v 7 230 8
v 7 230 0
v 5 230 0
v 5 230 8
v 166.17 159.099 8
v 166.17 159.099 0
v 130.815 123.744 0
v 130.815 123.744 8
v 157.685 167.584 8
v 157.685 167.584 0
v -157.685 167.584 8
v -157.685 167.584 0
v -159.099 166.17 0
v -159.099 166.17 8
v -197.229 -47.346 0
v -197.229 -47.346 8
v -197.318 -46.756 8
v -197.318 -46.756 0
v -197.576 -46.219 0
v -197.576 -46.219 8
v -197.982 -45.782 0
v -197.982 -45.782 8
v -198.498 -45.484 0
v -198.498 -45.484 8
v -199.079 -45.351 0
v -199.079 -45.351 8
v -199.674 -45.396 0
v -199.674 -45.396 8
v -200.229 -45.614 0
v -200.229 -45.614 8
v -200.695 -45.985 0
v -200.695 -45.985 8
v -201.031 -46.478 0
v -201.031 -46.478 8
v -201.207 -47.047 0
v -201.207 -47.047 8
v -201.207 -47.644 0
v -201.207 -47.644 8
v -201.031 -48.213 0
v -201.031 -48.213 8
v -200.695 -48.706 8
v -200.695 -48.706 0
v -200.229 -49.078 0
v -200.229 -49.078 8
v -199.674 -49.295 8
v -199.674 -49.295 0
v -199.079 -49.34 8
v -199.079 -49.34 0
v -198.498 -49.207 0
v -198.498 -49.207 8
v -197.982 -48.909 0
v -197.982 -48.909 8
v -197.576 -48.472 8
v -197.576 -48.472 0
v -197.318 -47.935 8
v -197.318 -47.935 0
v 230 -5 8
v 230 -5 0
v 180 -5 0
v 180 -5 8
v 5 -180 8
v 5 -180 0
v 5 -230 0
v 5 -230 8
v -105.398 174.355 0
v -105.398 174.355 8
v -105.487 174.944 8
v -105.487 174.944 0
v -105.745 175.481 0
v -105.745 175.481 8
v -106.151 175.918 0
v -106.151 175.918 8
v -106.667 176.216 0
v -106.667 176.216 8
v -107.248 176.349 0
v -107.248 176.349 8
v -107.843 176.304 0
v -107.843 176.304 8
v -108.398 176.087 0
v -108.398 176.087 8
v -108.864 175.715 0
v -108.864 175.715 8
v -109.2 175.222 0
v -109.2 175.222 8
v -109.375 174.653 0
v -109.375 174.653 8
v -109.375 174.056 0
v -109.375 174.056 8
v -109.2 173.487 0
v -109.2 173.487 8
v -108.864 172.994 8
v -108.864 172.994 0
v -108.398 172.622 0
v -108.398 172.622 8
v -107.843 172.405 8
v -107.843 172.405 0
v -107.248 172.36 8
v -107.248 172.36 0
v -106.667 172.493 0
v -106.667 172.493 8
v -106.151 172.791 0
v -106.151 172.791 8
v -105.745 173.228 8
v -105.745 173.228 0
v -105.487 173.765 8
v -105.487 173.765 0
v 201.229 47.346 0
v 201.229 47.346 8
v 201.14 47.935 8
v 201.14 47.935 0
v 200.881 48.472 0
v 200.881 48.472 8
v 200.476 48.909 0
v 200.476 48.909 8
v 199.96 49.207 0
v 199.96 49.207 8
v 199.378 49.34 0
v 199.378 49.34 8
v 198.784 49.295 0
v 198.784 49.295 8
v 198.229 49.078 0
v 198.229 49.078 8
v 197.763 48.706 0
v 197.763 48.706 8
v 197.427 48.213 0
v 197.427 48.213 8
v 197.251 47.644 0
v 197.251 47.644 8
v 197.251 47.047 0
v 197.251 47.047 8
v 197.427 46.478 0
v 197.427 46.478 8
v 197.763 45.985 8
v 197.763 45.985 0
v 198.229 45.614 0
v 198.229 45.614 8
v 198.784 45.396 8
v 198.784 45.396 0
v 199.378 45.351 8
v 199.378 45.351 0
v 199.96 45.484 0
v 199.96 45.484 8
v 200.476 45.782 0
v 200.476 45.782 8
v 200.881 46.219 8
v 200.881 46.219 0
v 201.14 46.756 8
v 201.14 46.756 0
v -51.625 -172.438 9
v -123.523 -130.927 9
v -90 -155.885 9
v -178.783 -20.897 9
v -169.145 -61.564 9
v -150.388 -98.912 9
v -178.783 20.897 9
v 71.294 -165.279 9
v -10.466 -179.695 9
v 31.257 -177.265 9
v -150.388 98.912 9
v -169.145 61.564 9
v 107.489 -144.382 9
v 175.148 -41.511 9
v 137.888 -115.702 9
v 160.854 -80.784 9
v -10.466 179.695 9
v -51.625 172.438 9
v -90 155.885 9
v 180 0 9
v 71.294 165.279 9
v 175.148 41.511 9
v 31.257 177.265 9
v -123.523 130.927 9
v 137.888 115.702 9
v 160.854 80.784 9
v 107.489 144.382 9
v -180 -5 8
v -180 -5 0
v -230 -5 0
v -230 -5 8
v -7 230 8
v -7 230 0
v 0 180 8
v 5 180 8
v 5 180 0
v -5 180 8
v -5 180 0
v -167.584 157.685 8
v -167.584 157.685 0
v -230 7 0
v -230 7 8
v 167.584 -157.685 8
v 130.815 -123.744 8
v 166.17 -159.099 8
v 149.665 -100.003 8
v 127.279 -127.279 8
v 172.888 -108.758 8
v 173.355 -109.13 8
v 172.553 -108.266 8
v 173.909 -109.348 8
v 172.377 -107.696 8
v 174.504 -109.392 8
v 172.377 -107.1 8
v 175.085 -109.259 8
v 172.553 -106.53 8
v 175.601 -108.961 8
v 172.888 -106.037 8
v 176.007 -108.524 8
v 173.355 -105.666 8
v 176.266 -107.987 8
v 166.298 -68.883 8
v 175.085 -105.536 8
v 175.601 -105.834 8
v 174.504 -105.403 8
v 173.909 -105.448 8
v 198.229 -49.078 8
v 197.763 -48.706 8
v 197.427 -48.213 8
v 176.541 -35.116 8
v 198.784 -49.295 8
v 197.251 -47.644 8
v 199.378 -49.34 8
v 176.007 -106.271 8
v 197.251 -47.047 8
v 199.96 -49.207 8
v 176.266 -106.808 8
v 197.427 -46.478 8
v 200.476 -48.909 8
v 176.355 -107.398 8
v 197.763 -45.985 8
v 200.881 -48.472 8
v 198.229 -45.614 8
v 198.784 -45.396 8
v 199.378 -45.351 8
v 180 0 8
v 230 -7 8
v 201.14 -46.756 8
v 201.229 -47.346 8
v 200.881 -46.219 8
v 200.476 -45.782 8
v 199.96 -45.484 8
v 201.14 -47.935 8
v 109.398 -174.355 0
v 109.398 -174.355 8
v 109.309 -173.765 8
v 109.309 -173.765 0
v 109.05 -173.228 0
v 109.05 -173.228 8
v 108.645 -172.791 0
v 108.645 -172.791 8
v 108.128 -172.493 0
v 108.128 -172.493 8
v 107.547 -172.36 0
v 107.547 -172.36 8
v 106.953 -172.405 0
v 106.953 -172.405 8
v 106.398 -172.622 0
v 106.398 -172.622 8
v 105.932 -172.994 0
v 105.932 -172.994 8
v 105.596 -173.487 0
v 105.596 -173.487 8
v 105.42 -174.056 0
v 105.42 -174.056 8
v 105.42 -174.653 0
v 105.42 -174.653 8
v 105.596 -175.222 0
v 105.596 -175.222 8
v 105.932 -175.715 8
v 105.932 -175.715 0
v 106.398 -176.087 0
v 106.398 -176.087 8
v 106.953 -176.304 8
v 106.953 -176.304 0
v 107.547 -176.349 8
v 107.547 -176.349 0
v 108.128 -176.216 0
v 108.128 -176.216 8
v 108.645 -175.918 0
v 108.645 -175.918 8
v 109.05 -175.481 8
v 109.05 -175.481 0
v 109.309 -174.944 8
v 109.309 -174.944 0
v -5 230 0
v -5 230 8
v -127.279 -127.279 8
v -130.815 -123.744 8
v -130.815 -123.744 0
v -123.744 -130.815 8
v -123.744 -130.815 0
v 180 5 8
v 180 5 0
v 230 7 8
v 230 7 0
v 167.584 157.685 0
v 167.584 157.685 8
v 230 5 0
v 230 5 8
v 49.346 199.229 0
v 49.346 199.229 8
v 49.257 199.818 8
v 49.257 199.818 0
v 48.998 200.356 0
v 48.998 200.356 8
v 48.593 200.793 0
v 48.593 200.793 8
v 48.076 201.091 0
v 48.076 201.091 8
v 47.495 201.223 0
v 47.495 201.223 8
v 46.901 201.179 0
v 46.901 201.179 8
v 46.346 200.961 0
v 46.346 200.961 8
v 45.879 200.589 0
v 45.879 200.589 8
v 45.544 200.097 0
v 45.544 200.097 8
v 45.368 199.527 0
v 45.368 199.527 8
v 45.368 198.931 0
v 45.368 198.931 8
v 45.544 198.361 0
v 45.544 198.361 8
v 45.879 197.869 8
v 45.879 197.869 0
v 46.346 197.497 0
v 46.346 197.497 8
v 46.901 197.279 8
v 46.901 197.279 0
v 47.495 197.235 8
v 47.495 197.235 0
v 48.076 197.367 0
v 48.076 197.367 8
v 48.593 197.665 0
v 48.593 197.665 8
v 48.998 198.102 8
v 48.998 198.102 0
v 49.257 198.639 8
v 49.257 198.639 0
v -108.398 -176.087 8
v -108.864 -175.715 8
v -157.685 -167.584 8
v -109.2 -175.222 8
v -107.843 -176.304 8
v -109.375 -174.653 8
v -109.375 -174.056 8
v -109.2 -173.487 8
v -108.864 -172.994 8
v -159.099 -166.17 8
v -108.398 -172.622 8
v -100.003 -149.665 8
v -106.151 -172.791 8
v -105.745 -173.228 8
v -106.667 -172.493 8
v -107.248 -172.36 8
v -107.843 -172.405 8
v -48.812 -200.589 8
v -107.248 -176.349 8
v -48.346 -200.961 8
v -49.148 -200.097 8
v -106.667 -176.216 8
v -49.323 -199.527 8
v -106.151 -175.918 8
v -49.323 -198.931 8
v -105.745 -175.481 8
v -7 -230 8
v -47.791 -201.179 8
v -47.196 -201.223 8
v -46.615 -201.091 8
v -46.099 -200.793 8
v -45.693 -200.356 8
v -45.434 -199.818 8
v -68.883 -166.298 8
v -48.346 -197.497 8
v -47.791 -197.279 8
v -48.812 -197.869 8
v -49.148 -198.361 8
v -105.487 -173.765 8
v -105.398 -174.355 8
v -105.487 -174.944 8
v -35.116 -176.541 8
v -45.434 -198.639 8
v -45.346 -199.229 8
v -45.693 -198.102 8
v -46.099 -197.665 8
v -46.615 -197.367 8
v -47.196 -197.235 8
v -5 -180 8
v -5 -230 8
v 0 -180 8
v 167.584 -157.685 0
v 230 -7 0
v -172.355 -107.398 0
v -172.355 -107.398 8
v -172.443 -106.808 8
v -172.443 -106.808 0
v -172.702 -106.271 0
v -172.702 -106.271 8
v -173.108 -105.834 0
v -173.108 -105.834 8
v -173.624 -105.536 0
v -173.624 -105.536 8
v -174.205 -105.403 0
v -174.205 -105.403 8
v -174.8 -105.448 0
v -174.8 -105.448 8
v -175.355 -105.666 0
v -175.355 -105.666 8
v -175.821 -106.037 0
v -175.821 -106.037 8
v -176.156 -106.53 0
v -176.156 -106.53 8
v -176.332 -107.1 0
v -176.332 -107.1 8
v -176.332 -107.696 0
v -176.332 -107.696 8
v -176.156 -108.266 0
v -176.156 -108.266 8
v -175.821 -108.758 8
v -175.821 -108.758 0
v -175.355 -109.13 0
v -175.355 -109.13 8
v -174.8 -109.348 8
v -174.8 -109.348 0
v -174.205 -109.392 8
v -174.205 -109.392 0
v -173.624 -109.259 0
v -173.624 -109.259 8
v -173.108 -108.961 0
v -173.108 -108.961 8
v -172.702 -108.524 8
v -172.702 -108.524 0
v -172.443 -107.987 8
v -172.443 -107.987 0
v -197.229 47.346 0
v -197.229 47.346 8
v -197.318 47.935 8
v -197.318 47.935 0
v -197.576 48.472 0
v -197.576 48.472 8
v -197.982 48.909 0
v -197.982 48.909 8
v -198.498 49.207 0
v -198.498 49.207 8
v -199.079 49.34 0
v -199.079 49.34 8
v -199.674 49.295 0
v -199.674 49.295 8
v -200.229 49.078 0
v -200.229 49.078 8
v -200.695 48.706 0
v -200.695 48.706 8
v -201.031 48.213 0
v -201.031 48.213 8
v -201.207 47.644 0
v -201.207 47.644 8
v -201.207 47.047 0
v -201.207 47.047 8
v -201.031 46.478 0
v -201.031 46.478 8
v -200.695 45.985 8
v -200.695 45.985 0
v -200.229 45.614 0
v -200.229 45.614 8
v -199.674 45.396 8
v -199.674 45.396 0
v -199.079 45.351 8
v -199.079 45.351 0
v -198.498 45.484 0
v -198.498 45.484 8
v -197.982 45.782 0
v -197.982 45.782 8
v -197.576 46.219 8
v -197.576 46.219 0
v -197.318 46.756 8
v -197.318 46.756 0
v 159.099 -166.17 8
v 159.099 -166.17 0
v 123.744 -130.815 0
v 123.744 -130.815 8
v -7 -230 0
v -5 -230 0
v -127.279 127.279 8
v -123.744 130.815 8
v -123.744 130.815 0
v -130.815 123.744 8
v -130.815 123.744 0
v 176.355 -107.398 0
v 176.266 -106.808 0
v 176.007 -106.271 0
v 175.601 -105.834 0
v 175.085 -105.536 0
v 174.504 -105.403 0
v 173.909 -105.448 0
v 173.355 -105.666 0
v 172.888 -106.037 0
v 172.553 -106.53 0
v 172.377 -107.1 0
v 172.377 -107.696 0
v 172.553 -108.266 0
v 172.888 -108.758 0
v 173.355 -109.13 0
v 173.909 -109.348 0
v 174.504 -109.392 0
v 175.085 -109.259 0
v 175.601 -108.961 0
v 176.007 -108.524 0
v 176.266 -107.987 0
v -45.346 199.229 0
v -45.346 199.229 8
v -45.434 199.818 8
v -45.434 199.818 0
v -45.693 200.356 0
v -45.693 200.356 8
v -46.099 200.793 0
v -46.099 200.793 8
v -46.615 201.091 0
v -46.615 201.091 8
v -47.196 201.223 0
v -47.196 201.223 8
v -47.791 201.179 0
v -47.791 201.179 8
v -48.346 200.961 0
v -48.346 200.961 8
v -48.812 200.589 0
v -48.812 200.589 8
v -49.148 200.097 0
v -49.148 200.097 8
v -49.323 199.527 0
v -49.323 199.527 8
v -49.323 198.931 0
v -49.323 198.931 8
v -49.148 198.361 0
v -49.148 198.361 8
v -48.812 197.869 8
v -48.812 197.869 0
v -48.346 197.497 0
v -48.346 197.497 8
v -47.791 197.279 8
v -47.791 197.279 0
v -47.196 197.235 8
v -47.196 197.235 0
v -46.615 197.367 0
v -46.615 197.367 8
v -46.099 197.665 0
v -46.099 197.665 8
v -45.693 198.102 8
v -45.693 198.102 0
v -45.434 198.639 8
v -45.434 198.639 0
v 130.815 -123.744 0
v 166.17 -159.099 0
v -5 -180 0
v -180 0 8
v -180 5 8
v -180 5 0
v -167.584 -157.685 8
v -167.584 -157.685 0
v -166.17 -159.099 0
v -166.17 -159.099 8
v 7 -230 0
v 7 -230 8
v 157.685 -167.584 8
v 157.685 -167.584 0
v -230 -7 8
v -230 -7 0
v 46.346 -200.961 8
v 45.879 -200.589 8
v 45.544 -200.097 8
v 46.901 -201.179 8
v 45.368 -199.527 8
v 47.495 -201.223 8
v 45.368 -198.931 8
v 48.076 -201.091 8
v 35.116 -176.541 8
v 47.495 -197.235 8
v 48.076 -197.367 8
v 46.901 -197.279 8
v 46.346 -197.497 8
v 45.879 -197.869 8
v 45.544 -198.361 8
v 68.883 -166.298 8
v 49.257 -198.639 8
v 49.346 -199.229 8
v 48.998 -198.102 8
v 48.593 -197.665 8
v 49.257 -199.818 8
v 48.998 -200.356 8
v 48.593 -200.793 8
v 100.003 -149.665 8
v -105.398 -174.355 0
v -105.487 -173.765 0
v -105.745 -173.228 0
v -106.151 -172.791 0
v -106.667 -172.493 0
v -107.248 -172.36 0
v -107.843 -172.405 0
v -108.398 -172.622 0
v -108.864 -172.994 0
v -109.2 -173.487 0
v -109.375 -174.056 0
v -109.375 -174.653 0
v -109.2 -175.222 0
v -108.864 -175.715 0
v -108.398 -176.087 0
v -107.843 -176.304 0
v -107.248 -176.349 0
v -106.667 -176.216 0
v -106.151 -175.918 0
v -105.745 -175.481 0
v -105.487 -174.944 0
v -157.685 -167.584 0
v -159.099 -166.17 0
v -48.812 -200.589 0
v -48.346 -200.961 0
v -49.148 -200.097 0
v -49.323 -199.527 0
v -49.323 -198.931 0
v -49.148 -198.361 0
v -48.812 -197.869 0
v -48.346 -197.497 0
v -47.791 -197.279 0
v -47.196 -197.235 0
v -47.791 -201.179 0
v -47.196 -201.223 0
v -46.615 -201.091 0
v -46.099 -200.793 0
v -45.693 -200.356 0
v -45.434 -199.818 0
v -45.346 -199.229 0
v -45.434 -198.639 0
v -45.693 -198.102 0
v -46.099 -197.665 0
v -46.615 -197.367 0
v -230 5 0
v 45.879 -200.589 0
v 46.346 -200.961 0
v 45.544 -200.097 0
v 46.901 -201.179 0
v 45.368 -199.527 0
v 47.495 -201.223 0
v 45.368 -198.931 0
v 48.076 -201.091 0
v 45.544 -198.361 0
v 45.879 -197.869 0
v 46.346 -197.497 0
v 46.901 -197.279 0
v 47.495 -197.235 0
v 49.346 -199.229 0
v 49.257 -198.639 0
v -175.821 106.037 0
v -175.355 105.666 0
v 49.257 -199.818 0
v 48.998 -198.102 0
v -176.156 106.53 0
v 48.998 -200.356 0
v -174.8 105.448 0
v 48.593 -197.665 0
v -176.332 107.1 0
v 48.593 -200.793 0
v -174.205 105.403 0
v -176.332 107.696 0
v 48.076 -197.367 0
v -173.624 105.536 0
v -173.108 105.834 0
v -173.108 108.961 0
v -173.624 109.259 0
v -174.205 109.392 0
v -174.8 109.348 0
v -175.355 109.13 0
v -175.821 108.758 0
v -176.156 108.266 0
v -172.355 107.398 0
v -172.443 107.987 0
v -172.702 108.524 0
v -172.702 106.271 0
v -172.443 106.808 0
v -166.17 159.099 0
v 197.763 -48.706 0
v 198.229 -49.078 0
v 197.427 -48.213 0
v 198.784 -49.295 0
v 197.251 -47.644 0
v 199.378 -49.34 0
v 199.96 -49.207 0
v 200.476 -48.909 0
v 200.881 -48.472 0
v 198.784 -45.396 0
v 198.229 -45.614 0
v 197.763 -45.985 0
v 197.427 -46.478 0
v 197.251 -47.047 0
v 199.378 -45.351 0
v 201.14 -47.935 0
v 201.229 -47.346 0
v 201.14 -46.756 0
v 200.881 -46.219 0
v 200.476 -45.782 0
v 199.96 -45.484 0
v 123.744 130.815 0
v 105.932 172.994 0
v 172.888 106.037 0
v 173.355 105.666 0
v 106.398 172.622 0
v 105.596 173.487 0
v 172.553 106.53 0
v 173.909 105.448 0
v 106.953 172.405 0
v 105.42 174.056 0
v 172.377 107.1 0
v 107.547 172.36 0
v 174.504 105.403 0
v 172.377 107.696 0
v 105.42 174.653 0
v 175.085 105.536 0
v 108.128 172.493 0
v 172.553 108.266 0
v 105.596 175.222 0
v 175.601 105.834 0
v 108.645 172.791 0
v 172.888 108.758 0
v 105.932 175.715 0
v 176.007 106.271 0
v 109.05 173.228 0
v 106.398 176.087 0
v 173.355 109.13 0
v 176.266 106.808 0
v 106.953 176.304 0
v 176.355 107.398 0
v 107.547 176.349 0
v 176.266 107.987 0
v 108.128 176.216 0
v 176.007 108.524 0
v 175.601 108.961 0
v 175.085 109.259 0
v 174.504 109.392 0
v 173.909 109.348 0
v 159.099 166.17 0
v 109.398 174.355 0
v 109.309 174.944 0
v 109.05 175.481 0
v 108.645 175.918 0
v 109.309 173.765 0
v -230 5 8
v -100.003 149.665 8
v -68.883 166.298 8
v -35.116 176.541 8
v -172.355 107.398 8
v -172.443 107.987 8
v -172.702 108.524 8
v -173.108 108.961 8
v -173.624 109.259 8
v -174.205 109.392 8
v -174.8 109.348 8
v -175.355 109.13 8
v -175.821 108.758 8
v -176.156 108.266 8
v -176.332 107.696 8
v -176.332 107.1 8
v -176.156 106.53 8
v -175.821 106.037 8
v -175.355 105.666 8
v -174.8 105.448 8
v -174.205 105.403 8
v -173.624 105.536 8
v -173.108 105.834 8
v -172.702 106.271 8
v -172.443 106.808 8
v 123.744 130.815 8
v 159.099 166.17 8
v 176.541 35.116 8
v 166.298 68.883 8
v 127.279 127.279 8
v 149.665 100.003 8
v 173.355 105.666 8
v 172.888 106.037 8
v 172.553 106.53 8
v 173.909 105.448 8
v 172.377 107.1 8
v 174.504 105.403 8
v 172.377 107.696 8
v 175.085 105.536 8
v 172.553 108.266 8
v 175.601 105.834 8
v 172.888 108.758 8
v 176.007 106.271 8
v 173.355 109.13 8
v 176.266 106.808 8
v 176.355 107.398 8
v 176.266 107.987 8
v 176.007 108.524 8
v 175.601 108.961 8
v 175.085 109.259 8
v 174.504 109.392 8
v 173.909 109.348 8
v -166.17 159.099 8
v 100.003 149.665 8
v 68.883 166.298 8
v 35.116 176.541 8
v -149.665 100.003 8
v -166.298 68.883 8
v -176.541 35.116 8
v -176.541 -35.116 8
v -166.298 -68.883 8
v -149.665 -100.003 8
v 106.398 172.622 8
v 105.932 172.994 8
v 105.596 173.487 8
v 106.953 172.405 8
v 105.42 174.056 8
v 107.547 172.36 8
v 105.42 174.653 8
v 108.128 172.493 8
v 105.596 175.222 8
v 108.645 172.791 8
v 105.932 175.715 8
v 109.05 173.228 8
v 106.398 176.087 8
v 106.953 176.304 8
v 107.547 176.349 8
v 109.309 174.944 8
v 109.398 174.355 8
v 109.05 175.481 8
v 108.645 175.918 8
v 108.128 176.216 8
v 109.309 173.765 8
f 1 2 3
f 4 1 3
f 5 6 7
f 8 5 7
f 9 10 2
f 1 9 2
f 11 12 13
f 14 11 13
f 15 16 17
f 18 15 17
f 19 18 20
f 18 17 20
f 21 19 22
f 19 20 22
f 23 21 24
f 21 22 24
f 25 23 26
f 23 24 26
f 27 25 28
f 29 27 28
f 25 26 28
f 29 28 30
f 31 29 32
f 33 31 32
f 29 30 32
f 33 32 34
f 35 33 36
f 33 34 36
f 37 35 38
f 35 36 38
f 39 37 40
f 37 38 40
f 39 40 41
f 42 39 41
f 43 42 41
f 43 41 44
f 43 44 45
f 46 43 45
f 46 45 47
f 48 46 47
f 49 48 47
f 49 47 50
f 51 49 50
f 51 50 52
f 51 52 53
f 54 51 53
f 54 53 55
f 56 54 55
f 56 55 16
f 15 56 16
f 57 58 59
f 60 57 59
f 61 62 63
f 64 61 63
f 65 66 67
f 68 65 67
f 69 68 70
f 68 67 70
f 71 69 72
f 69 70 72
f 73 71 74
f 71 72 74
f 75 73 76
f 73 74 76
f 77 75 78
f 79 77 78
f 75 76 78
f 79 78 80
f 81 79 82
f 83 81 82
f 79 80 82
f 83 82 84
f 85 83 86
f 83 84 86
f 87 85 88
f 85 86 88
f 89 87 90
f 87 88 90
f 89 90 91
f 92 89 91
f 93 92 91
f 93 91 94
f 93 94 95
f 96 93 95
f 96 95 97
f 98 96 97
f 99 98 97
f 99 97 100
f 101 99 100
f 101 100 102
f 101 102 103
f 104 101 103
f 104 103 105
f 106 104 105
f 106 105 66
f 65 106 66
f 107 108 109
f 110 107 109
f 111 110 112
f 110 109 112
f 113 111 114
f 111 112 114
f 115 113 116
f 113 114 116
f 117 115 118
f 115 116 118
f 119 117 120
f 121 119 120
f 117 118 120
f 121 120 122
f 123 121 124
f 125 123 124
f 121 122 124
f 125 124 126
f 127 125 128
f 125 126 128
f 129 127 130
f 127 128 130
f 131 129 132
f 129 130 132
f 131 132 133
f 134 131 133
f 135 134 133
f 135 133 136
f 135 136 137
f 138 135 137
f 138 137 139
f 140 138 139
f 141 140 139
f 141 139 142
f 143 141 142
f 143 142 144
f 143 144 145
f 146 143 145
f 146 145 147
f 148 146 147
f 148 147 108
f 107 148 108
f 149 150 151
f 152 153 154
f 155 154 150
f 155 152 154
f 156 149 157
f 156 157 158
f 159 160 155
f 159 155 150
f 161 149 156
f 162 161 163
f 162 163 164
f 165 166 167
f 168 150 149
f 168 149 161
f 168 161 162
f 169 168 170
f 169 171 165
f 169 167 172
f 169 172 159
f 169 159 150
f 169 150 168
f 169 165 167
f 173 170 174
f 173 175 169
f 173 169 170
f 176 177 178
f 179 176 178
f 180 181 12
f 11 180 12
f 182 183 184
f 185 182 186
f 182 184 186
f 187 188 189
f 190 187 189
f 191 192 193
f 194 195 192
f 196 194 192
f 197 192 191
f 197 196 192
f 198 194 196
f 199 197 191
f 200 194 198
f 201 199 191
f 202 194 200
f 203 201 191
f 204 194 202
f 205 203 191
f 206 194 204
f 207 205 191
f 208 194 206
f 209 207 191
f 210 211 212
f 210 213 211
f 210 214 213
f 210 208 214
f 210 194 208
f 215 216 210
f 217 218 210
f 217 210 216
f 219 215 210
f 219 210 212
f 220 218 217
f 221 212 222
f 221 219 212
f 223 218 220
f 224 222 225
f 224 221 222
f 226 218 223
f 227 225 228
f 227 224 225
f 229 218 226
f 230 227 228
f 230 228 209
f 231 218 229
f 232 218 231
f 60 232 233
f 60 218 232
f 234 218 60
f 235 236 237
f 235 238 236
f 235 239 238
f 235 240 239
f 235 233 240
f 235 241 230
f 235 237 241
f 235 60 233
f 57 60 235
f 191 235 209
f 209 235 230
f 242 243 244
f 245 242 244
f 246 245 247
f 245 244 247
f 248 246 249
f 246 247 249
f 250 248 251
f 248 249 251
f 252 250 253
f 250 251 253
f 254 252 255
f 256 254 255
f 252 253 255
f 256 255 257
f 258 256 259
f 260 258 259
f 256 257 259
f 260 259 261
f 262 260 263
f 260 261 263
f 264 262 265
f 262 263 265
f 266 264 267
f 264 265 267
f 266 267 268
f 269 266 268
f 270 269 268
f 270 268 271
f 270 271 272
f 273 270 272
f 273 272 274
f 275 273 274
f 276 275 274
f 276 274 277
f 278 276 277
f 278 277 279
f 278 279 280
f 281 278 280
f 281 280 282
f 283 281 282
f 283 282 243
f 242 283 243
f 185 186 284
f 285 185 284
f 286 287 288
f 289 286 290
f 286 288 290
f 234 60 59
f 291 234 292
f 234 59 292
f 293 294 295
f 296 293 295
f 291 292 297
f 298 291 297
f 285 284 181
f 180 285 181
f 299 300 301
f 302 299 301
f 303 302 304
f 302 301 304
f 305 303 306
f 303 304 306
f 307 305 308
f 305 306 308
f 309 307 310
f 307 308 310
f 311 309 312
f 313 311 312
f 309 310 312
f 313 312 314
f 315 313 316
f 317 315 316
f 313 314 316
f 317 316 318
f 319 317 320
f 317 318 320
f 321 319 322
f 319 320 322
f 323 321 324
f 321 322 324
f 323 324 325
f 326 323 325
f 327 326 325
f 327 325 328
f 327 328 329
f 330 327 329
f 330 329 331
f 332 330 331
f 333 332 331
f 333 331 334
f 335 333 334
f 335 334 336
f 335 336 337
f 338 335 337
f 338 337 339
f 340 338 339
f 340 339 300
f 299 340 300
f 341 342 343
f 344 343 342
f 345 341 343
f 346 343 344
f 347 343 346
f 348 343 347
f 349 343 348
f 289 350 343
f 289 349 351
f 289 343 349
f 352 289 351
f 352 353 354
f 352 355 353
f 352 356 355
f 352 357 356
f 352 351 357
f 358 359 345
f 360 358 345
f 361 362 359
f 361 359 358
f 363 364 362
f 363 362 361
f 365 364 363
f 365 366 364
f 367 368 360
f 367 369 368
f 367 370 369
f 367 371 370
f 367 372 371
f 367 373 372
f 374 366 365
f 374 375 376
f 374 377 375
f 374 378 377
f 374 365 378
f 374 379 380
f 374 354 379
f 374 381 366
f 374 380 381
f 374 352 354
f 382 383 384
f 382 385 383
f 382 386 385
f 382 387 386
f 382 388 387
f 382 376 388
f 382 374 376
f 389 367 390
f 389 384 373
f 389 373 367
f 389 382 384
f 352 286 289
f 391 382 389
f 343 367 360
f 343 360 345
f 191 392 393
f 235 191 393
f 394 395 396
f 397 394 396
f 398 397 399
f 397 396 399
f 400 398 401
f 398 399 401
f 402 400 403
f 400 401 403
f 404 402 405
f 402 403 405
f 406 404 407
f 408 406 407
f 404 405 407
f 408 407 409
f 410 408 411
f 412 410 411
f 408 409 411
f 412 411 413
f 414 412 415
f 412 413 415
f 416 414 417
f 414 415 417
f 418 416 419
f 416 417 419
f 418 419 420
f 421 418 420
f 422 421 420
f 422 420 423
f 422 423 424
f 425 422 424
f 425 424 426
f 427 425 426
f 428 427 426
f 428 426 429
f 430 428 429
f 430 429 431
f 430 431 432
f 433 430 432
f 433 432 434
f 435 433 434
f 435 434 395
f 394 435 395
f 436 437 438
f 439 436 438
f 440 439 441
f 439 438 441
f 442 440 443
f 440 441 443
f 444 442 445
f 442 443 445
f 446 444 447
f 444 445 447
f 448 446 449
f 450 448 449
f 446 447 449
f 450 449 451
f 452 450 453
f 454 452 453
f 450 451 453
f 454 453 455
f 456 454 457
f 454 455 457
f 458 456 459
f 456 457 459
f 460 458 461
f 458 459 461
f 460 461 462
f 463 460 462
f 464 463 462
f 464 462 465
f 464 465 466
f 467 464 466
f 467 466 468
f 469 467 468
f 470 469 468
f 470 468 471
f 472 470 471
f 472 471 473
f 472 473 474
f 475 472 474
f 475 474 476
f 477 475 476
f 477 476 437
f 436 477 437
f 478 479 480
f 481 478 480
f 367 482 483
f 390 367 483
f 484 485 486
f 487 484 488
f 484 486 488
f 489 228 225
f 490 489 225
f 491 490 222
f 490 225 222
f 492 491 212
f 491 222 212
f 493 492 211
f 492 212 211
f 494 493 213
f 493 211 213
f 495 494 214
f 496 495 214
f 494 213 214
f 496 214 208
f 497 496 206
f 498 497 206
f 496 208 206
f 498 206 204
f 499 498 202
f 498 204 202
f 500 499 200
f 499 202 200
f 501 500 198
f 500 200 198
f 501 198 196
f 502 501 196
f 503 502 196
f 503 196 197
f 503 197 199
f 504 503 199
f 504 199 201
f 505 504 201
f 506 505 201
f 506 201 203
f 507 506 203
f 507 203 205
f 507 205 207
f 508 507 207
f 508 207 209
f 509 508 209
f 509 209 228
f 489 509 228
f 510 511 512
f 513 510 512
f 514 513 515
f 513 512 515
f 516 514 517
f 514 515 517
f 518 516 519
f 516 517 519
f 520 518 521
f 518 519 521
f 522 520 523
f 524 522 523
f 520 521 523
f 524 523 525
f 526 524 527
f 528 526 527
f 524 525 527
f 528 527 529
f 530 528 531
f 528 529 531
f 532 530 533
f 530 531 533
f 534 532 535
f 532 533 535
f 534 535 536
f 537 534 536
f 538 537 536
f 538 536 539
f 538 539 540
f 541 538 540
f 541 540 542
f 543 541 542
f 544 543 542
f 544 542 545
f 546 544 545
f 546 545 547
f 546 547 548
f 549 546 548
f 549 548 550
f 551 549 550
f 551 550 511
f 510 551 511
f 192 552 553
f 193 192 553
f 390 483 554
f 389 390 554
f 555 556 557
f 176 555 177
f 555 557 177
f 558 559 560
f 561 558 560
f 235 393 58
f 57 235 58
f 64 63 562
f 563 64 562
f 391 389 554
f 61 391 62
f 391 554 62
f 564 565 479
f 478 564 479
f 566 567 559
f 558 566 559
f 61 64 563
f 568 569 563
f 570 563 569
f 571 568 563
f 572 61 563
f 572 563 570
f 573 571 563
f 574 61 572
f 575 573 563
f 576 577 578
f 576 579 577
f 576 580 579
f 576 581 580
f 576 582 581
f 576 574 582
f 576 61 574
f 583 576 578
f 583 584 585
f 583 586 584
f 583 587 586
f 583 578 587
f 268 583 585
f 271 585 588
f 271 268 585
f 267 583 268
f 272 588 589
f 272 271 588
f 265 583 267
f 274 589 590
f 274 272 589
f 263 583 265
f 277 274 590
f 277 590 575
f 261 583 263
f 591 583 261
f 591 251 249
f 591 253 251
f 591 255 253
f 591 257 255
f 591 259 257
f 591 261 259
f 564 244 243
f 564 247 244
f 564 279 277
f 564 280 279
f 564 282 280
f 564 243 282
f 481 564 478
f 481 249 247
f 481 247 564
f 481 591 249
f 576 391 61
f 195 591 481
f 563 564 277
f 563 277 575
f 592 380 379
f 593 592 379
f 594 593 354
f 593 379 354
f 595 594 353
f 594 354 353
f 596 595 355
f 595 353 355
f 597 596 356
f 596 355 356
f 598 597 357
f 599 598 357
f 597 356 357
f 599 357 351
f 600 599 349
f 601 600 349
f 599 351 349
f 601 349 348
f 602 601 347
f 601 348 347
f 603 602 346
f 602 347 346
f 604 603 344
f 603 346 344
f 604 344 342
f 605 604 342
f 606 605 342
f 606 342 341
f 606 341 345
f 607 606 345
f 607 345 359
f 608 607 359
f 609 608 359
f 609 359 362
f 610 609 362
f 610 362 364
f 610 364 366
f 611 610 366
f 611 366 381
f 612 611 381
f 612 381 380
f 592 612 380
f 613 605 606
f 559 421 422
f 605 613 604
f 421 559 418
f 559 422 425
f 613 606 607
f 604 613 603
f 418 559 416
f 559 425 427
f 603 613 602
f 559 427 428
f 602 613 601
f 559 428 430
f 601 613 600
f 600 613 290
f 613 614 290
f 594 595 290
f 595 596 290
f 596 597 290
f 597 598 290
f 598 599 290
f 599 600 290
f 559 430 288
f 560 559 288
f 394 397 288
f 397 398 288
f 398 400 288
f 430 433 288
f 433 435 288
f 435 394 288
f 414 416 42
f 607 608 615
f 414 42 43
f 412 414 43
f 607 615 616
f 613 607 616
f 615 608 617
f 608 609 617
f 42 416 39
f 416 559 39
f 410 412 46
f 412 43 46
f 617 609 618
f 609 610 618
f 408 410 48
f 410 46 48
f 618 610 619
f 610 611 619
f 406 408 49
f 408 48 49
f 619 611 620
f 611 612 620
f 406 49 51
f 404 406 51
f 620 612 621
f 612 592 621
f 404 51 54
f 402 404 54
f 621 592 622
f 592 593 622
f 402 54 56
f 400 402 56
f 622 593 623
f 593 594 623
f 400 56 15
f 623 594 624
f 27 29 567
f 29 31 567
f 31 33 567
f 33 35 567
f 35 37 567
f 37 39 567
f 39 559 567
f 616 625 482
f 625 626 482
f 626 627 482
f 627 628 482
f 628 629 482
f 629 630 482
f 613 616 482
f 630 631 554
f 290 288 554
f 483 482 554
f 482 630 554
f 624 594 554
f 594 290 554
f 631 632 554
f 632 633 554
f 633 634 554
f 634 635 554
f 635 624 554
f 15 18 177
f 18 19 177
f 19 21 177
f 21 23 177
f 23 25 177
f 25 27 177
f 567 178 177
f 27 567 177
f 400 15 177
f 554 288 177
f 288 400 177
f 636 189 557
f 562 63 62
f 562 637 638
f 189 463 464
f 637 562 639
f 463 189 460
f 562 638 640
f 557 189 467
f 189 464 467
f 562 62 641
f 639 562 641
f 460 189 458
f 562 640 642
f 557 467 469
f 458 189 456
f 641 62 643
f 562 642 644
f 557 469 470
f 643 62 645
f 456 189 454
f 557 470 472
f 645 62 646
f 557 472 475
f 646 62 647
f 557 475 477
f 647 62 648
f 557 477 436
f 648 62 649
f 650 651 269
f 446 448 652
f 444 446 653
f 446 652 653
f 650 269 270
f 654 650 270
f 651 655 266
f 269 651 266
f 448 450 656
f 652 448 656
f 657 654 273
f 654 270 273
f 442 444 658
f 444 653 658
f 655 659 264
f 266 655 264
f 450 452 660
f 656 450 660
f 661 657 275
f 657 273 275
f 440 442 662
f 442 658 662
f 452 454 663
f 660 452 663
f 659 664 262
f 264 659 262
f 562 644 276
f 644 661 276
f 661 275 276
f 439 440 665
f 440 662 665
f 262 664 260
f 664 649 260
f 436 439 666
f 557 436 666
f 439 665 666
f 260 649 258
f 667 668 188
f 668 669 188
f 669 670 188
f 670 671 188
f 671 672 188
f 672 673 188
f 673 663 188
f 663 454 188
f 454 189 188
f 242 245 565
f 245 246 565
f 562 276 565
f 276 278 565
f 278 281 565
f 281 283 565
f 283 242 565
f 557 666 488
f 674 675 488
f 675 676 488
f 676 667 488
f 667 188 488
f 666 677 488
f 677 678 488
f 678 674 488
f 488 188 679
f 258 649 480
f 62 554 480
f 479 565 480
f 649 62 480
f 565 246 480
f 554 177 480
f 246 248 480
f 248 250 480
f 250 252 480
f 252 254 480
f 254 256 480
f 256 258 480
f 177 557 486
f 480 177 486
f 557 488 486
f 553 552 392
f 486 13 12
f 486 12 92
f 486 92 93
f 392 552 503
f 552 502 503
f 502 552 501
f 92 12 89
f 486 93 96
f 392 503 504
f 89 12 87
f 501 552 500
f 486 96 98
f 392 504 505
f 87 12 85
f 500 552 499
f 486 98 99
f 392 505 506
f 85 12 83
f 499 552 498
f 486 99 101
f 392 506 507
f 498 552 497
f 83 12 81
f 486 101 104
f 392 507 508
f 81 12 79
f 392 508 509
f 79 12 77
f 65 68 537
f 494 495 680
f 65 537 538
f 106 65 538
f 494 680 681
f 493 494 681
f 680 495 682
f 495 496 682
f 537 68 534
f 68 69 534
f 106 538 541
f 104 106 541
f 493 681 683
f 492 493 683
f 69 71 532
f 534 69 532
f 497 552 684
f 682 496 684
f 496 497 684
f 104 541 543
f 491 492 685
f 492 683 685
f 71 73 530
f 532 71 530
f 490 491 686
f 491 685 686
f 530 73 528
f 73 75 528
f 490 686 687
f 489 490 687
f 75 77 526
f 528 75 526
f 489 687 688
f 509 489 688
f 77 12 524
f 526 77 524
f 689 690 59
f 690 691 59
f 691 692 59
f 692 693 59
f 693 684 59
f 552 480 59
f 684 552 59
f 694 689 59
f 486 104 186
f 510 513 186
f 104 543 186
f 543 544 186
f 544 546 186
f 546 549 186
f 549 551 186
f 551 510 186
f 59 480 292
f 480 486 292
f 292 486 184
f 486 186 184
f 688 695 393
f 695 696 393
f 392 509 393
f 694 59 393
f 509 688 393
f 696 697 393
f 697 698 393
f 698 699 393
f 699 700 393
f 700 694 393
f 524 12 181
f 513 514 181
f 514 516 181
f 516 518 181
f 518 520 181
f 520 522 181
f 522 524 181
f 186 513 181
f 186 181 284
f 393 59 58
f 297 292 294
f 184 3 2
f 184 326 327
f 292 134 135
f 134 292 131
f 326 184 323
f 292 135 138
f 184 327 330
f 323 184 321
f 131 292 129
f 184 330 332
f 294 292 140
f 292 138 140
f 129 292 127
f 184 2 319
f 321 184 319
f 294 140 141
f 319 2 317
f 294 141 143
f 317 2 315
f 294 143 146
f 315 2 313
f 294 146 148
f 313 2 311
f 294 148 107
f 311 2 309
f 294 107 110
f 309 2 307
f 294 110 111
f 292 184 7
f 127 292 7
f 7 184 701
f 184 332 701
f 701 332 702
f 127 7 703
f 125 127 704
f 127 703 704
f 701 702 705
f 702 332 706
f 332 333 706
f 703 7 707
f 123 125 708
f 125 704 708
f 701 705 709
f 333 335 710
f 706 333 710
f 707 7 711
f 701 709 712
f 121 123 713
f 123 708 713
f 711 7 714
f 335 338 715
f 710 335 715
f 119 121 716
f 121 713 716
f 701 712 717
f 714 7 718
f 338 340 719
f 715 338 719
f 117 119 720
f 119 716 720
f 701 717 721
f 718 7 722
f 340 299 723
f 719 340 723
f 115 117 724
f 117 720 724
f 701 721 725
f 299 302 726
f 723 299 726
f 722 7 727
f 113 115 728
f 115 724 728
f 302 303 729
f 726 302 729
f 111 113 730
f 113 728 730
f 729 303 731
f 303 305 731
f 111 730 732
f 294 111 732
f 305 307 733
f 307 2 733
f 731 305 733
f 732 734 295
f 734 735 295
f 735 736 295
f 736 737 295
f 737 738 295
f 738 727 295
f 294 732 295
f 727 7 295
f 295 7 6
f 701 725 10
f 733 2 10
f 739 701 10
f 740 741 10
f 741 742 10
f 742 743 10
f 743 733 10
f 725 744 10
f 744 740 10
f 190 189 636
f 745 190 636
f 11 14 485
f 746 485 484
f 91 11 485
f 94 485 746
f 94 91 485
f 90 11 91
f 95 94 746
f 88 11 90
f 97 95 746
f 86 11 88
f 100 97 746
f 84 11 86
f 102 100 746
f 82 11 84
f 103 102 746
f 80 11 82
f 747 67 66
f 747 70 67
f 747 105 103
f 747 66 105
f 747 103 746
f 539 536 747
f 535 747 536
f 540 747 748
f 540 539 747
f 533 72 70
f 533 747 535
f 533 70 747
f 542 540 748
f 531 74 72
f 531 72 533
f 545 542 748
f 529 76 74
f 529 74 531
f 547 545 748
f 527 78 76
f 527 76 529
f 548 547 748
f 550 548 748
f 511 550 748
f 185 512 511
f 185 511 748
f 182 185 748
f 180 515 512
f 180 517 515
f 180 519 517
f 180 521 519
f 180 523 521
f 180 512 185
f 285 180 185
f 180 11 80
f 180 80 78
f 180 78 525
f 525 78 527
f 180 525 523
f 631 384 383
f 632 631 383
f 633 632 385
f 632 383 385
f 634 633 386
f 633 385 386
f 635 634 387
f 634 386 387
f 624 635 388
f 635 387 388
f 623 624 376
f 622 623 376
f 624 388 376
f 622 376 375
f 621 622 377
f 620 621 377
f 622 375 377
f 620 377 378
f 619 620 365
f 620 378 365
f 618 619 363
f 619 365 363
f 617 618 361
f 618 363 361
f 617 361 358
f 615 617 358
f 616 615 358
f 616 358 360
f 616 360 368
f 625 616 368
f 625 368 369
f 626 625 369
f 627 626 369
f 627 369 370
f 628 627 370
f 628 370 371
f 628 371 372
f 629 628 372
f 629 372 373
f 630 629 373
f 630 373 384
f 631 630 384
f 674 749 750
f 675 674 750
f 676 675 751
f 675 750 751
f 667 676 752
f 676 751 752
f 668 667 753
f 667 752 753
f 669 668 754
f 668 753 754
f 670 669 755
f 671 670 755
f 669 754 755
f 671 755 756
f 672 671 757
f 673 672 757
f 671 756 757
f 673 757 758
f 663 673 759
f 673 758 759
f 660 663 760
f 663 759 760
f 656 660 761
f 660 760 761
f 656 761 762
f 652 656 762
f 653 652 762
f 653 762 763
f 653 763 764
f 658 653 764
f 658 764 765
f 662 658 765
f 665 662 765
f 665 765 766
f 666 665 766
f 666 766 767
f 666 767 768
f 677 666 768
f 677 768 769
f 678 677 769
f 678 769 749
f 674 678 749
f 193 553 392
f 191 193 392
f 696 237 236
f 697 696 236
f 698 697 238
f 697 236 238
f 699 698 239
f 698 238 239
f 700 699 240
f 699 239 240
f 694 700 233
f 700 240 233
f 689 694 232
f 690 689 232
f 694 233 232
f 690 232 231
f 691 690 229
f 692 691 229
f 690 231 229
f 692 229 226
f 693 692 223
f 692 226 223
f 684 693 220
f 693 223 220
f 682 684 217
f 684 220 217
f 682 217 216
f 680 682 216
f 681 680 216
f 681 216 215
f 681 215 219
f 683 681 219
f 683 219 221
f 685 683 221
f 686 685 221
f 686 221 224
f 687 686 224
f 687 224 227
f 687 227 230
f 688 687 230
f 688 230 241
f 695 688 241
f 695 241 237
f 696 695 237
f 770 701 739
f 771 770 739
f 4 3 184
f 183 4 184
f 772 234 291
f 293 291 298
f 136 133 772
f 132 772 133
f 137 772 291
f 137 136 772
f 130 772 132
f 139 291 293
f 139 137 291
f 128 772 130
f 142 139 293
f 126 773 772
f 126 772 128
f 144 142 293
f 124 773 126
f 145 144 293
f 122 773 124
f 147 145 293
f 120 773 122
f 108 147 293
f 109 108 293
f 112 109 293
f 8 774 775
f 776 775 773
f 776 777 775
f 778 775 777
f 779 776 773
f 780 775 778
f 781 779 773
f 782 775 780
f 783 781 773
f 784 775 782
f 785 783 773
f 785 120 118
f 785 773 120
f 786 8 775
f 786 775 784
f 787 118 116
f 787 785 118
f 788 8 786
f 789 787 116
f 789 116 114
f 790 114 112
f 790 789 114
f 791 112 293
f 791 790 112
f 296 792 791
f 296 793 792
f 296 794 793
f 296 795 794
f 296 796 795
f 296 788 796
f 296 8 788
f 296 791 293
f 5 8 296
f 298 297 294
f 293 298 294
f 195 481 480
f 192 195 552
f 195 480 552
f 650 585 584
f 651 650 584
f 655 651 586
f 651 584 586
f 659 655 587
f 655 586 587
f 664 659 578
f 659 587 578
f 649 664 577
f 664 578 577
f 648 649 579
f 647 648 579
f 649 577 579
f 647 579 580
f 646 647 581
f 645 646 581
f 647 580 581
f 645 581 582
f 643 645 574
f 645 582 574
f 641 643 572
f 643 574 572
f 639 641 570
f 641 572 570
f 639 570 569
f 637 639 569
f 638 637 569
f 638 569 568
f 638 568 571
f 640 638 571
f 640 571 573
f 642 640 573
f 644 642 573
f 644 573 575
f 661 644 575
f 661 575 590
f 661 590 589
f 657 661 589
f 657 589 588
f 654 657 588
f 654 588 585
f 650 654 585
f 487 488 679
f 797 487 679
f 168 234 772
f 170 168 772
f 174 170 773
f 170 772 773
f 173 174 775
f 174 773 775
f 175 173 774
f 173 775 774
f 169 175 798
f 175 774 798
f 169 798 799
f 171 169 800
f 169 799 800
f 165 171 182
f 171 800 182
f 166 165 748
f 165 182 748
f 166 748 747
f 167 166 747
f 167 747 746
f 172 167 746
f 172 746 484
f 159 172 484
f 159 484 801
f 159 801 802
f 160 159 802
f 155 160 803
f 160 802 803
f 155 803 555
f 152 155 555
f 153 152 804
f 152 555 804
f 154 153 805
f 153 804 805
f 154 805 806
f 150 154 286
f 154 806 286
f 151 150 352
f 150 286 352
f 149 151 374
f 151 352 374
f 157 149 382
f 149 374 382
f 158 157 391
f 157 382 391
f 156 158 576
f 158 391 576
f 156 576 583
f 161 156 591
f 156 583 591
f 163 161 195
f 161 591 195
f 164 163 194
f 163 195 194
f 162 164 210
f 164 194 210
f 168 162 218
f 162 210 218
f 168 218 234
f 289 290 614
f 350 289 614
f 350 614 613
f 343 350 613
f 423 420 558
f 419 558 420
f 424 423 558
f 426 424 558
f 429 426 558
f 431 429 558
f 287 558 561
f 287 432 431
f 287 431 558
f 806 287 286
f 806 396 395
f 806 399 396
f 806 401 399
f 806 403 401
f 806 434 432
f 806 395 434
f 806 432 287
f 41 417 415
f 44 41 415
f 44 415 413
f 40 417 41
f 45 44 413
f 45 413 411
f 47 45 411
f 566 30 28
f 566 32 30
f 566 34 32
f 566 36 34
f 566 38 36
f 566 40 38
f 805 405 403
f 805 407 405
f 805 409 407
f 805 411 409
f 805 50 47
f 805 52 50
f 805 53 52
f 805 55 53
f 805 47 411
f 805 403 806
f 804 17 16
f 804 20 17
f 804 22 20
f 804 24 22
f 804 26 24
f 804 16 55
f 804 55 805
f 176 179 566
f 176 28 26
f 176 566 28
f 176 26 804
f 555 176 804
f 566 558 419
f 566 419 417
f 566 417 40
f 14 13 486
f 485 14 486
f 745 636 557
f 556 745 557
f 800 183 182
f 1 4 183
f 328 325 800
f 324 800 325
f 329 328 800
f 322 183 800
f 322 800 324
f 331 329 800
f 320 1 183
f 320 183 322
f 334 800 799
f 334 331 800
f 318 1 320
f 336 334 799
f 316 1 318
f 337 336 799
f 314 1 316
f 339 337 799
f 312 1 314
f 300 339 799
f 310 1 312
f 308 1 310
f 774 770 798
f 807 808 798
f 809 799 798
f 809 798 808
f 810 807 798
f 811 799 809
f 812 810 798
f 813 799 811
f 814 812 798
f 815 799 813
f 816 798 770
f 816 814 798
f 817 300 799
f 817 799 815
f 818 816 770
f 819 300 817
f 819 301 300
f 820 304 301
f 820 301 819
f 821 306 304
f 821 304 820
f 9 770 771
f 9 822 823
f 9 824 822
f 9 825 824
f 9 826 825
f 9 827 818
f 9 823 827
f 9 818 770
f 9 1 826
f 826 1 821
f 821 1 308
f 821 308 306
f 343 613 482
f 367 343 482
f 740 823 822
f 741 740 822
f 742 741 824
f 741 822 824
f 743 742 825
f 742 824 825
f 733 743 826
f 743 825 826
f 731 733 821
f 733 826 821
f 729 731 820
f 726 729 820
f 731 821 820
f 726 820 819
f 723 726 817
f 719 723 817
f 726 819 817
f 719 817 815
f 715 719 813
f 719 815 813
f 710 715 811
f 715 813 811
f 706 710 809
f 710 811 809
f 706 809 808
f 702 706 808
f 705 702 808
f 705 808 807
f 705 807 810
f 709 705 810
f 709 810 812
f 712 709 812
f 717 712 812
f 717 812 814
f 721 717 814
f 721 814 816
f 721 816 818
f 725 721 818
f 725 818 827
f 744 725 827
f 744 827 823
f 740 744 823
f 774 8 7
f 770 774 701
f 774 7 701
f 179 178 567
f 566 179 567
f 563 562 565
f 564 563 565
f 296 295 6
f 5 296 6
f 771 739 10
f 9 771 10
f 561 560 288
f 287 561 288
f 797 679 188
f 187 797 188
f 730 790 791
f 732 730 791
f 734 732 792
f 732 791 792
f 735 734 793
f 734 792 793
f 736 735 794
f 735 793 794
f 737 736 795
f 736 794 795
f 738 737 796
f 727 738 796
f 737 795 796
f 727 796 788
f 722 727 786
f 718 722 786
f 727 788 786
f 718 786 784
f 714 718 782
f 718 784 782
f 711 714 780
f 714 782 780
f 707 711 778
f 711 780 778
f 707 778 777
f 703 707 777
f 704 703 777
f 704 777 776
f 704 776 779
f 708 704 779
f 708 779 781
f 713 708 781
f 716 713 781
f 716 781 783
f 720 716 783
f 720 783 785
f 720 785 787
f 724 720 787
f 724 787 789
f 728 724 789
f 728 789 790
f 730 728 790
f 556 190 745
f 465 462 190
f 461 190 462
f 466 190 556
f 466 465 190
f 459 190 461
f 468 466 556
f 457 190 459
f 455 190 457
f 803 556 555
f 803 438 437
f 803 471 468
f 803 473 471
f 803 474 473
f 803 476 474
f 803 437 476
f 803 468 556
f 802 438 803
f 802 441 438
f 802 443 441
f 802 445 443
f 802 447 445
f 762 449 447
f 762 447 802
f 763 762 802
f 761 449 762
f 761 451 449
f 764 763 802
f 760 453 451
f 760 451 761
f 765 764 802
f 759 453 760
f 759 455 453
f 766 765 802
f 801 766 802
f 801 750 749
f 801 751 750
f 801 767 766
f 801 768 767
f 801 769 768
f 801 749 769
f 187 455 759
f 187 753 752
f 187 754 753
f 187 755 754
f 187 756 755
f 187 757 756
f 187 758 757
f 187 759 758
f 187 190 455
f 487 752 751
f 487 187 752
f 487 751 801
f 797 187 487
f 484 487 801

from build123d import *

# Parameters (mm, degrees)
BOSS_EXTRUDE1_DEPTH = 8
SKETCH2_R           = 180
BOSS_EXTRUDE2_DEPTH = 1
CUT_EXTRUDE1_REACH  = 10
SKETCH3_R           = 2


with BuildPart() as part:
    # Sketch1 → Boss-Extrude1 (new body)
    with BuildSketch(Plane.XY):
        Polygon((5, 230), (5, 180), (-5, 180), (-5, 230), (-7, 230), (-157.684812205, 167.584307141), (-159.099025767, 166.170093579), (-123.743686708, 130.814754519), (-130.81475452, 123.743686708), (-166.170093579, 159.099025767), (-167.584307141, 157.684812205), (-230, 7), (-230, 5), (-180, 5), (-180, -5), (-230, -5), (-230, -7), (-167.584307141, -157.684812205), (-166.170093579, -159.099025767), (-130.81475452, -123.743686708), (-123.743686708, -130.81475452), (-159.099025767, -166.170093579), (-157.684812205, -167.584307141), (-7, -230), (-5, -230), (-5, -180), (5, -180), (5, -230), (7, -230), (157.684812205, -167.584307141), (159.099025767, -166.170093579), (123.743686708, -130.814754519), (130.81475452, -123.743686708), (166.170093579, -159.099025767), (167.584307141, -157.684812205), (230, -7), (230, -5), (180, -5), (180, 5), (230, 5), (230, 7), (167.584307141, 157.684812205), (166.170093579, 159.099025767), (130.81475452, 123.743686708), (123.743686708, 130.81475452), (159.099025767, 166.170093579), (157.684812205, 167.584307141), (7, 230), align=None)
    extrude(amount=BOSS_EXTRUDE1_DEPTH)

    # Sketch2 → Boss-Extrude2 (add)
    with BuildSketch(Plane.XY.offset(8)):
        Circle(SKETCH2_R)
    extrude(amount=BOSS_EXTRUDE2_DEPTH)

    # Sketch3 → Cut-Extrude1 (cut, up to next)
    with BuildSketch(Plane.XY.offset(8), mode=Mode.PRIVATE) as cut_extrude1_sk1:
        with Locations((107.397750993, 174.354514299)):
            Circle(SKETCH3_R)
    cut_extrude1_tool1 = extrude(cut_extrude1_sk1.sketch, amount=-CUT_EXTRUDE1_REACH, mode=Mode.PRIVATE) & part.part
    add(cut_extrude1_tool1.solids().sort_by_distance((107.397751, 174.354514, 8))[0], mode=Mode.SUBTRACT)
    # Sketch3 → Cut-Extrude1 (cut, up to next)
    with BuildSketch(Plane.XY.offset(8), mode=Mode.PRIVATE) as cut_extrude1_sk2:
        with Locations((47.34558138, 199.228937402)):
            Circle(SKETCH3_R)
    cut_extrude1_tool2 = extrude(cut_extrude1_sk2.sketch, amount=-CUT_EXTRUDE1_REACH, mode=Mode.PRIVATE) & part.part
    add(cut_extrude1_tool2.solids().sort_by_distance((47.345581, 199.228937, 8))[0], mode=Mode.SUBTRACT)
    # Sketch3 → Cut-Extrude1 (cut, up to next)
    with BuildSketch(Plane.XY.offset(8), mode=Mode.PRIVATE) as cut_extrude1_sk3:
        with Locations((199.228937402, 47.34558138)):
            Circle(SKETCH3_R)
    cut_extrude1_tool3 = extrude(cut_extrude1_sk3.sketch, amount=-CUT_EXTRUDE1_REACH, mode=Mode.PRIVATE) & part.part
    add(cut_extrude1_tool3.solids().sort_by_distance((199.228937, 47.345581, 8))[0], mode=Mode.SUBTRACT)
    # Sketch3 → Cut-Extrude1 (cut, up to next)
    with BuildSketch(Plane.XY.offset(8), mode=Mode.PRIVATE) as cut_extrude1_sk4:
        with Locations((174.354514299, 107.397750993)):
            Circle(SKETCH3_R)
    cut_extrude1_tool4 = extrude(cut_extrude1_sk4.sketch, amount=-CUT_EXTRUDE1_REACH, mode=Mode.PRIVATE) & part.part
    add(cut_extrude1_tool4.solids().sort_by_distance((174.354514, 107.397751, 8))[0], mode=Mode.SUBTRACT)
    # Sketch3 → Cut-Extrude1 (cut, up to next)
    with BuildSketch(Plane.XY.offset(8), mode=Mode.PRIVATE) as cut_extrude1_sk5:
        with Locations((174.354514299, -107.397750993)):
            Circle(SKETCH3_R)
    cut_extrude1_tool5 = extrude(cut_extrude1_sk5.sketch, amount=-CUT_EXTRUDE1_REACH, mode=Mode.PRIVATE) & part.part
    add(cut_extrude1_tool5.solids().sort_by_distance((174.354514, -107.397751, 8))[0], mode=Mode.SUBTRACT)
    # Sketch3 → Cut-Extrude1 (cut, up to next)
    with BuildSketch(Plane.XY.offset(8), mode=Mode.PRIVATE) as cut_extrude1_sk6:
        with Locations((199.228937402, -47.34558138)):
            Circle(SKETCH3_R)
    cut_extrude1_tool6 = extrude(cut_extrude1_sk6.sketch, amount=-CUT_EXTRUDE1_REACH, mode=Mode.PRIVATE) & part.part
    add(cut_extrude1_tool6.solids().sort_by_distance((199.228937, -47.345581, 8))[0], mode=Mode.SUBTRACT)
    # Sketch3 → Cut-Extrude1 (cut, up to next)
    with BuildSketch(Plane.XY.offset(8), mode=Mode.PRIVATE) as cut_extrude1_sk7:
        with Locations((47.34558138, -199.228937402)):
            Circle(SKETCH3_R)
    cut_extrude1_tool7 = extrude(cut_extrude1_sk7.sketch, amount=-CUT_EXTRUDE1_REACH, mode=Mode.PRIVATE) & part.part
    add(cut_extrude1_tool7.solids().sort_by_distance((47.345581, -199.228937, 8))[0], mode=Mode.SUBTRACT)
    # Sketch3 → Cut-Extrude1 (cut, up to next)
    with BuildSketch(Plane.XY.offset(8), mode=Mode.PRIVATE) as cut_extrude1_sk8:
        with Locations((107.397750993, -174.354514299)):
            Circle(SKETCH3_R)
    cut_extrude1_tool8 = extrude(cut_extrude1_sk8.sketch, amount=-CUT_EXTRUDE1_REACH, mode=Mode.PRIVATE) & part.part
    add(cut_extrude1_tool8.solids().sort_by_distance((107.397751, -174.354514, 8))[0], mode=Mode.SUBTRACT)
    # Sketch3 → Cut-Extrude1 (cut, up to next)
    with BuildSketch(Plane.XY.offset(8), mode=Mode.PRIVATE) as cut_extrude1_sk9:
        with Locations((-107.397750993, -174.354514299)):
            Circle(SKETCH3_R)
    cut_extrude1_tool9 = extrude(cut_extrude1_sk9.sketch, amount=-CUT_EXTRUDE1_REACH, mode=Mode.PRIVATE) & part.part
    add(cut_extrude1_tool9.solids().sort_by_distance((-107.397751, -174.354514, 8))[0], mode=Mode.SUBTRACT)
    # Sketch3 → Cut-Extrude1 (cut, up to next)
    with BuildSketch(Plane.XY.offset(8), mode=Mode.PRIVATE) as cut_extrude1_sk10:
        with Locations((-47.34558138, -199.228937402)):
            Circle(SKETCH3_R)
    cut_extrude1_tool10 = extrude(cut_extrude1_sk10.sketch, amount=-CUT_EXTRUDE1_REACH, mode=Mode.PRIVATE) & part.part
    add(cut_extrude1_tool10.solids().sort_by_distance((-47.345581, -199.228937, 8))[0], mode=Mode.SUBTRACT)
    # Sketch3 → Cut-Extrude1 (cut, up to next)
    with BuildSketch(Plane.XY.offset(8), mode=Mode.PRIVATE) as cut_extrude1_sk11:
        with Locations((-199.228937402, -47.34558138)):
            Circle(SKETCH3_R)
    cut_extrude1_tool11 = extrude(cut_extrude1_sk11.sketch, amount=-CUT_EXTRUDE1_REACH, mode=Mode.PRIVATE) & part.part
    add(cut_extrude1_tool11.solids().sort_by_distance((-199.228937, -47.345581, 8))[0], mode=Mode.SUBTRACT)
    # Sketch3 → Cut-Extrude1 (cut, up to next)
    with BuildSketch(Plane.XY.offset(8), mode=Mode.PRIVATE) as cut_extrude1_sk12:
        with Locations((-174.354514299, -107.397750993)):
            Circle(SKETCH3_R)
    cut_extrude1_tool12 = extrude(cut_extrude1_sk12.sketch, amount=-CUT_EXTRUDE1_REACH, mode=Mode.PRIVATE) & part.part
    add(cut_extrude1_tool12.solids().sort_by_distance((-174.354514, -107.397751, 8))[0], mode=Mode.SUBTRACT)
    # Sketch3 → Cut-Extrude1 (cut, up to next)
    with BuildSketch(Plane.XY.offset(8), mode=Mode.PRIVATE) as cut_extrude1_sk13:
        with Locations((-174.354514299, 107.397750993)):
            Circle(SKETCH3_R)
    cut_extrude1_tool13 = extrude(cut_extrude1_sk13.sketch, amount=-CUT_EXTRUDE1_REACH, mode=Mode.PRIVATE) & part.part
    add(cut_extrude1_tool13.solids().sort_by_distance((-174.354514, 107.397751, 8))[0], mode=Mode.SUBTRACT)
    # Sketch3 → Cut-Extrude1 (cut, up to next)
    with BuildSketch(Plane.XY.offset(8), mode=Mode.PRIVATE) as cut_extrude1_sk14:
        with Locations((-199.228937402, 47.34558138)):
            Circle(SKETCH3_R)
    cut_extrude1_tool14 = extrude(cut_extrude1_sk14.sketch, amount=-CUT_EXTRUDE1_REACH, mode=Mode.PRIVATE) & part.part
    add(cut_extrude1_tool14.solids().sort_by_distance((-199.228937, 47.345581, 8))[0], mode=Mode.SUBTRACT)
    # Sketch3 → Cut-Extrude1 (cut, up to next)
    with BuildSketch(Plane.XY.offset(8), mode=Mode.PRIVATE) as cut_extrude1_sk15:
        with Locations((-47.34558138, 199.228937402)):
            Circle(SKETCH3_R)
    cut_extrude1_tool15 = extrude(cut_extrude1_sk15.sketch, amount=-CUT_EXTRUDE1_REACH, mode=Mode.PRIVATE) & part.part
    add(cut_extrude1_tool15.solids().sort_by_distance((-47.345581, 199.228937, 8))[0], mode=Mode.SUBTRACT)
    # Sketch3 → Cut-Extrude1 (cut, up to next)
    with BuildSketch(Plane.XY.offset(8), mode=Mode.PRIVATE) as cut_extrude1_sk16:
        with Locations((-107.397750993, 174.354514299)):
            Circle(SKETCH3_R)
    cut_extrude1_tool16 = extrude(cut_extrude1_sk16.sketch, amount=-CUT_EXTRUDE1_REACH, mode=Mode.PRIVATE) & part.part
    add(cut_extrude1_tool16.solids().sort_by_distance((-107.397751, 174.354514, 8))[0], mode=Mode.SUBTRACT)


solid = part.part
